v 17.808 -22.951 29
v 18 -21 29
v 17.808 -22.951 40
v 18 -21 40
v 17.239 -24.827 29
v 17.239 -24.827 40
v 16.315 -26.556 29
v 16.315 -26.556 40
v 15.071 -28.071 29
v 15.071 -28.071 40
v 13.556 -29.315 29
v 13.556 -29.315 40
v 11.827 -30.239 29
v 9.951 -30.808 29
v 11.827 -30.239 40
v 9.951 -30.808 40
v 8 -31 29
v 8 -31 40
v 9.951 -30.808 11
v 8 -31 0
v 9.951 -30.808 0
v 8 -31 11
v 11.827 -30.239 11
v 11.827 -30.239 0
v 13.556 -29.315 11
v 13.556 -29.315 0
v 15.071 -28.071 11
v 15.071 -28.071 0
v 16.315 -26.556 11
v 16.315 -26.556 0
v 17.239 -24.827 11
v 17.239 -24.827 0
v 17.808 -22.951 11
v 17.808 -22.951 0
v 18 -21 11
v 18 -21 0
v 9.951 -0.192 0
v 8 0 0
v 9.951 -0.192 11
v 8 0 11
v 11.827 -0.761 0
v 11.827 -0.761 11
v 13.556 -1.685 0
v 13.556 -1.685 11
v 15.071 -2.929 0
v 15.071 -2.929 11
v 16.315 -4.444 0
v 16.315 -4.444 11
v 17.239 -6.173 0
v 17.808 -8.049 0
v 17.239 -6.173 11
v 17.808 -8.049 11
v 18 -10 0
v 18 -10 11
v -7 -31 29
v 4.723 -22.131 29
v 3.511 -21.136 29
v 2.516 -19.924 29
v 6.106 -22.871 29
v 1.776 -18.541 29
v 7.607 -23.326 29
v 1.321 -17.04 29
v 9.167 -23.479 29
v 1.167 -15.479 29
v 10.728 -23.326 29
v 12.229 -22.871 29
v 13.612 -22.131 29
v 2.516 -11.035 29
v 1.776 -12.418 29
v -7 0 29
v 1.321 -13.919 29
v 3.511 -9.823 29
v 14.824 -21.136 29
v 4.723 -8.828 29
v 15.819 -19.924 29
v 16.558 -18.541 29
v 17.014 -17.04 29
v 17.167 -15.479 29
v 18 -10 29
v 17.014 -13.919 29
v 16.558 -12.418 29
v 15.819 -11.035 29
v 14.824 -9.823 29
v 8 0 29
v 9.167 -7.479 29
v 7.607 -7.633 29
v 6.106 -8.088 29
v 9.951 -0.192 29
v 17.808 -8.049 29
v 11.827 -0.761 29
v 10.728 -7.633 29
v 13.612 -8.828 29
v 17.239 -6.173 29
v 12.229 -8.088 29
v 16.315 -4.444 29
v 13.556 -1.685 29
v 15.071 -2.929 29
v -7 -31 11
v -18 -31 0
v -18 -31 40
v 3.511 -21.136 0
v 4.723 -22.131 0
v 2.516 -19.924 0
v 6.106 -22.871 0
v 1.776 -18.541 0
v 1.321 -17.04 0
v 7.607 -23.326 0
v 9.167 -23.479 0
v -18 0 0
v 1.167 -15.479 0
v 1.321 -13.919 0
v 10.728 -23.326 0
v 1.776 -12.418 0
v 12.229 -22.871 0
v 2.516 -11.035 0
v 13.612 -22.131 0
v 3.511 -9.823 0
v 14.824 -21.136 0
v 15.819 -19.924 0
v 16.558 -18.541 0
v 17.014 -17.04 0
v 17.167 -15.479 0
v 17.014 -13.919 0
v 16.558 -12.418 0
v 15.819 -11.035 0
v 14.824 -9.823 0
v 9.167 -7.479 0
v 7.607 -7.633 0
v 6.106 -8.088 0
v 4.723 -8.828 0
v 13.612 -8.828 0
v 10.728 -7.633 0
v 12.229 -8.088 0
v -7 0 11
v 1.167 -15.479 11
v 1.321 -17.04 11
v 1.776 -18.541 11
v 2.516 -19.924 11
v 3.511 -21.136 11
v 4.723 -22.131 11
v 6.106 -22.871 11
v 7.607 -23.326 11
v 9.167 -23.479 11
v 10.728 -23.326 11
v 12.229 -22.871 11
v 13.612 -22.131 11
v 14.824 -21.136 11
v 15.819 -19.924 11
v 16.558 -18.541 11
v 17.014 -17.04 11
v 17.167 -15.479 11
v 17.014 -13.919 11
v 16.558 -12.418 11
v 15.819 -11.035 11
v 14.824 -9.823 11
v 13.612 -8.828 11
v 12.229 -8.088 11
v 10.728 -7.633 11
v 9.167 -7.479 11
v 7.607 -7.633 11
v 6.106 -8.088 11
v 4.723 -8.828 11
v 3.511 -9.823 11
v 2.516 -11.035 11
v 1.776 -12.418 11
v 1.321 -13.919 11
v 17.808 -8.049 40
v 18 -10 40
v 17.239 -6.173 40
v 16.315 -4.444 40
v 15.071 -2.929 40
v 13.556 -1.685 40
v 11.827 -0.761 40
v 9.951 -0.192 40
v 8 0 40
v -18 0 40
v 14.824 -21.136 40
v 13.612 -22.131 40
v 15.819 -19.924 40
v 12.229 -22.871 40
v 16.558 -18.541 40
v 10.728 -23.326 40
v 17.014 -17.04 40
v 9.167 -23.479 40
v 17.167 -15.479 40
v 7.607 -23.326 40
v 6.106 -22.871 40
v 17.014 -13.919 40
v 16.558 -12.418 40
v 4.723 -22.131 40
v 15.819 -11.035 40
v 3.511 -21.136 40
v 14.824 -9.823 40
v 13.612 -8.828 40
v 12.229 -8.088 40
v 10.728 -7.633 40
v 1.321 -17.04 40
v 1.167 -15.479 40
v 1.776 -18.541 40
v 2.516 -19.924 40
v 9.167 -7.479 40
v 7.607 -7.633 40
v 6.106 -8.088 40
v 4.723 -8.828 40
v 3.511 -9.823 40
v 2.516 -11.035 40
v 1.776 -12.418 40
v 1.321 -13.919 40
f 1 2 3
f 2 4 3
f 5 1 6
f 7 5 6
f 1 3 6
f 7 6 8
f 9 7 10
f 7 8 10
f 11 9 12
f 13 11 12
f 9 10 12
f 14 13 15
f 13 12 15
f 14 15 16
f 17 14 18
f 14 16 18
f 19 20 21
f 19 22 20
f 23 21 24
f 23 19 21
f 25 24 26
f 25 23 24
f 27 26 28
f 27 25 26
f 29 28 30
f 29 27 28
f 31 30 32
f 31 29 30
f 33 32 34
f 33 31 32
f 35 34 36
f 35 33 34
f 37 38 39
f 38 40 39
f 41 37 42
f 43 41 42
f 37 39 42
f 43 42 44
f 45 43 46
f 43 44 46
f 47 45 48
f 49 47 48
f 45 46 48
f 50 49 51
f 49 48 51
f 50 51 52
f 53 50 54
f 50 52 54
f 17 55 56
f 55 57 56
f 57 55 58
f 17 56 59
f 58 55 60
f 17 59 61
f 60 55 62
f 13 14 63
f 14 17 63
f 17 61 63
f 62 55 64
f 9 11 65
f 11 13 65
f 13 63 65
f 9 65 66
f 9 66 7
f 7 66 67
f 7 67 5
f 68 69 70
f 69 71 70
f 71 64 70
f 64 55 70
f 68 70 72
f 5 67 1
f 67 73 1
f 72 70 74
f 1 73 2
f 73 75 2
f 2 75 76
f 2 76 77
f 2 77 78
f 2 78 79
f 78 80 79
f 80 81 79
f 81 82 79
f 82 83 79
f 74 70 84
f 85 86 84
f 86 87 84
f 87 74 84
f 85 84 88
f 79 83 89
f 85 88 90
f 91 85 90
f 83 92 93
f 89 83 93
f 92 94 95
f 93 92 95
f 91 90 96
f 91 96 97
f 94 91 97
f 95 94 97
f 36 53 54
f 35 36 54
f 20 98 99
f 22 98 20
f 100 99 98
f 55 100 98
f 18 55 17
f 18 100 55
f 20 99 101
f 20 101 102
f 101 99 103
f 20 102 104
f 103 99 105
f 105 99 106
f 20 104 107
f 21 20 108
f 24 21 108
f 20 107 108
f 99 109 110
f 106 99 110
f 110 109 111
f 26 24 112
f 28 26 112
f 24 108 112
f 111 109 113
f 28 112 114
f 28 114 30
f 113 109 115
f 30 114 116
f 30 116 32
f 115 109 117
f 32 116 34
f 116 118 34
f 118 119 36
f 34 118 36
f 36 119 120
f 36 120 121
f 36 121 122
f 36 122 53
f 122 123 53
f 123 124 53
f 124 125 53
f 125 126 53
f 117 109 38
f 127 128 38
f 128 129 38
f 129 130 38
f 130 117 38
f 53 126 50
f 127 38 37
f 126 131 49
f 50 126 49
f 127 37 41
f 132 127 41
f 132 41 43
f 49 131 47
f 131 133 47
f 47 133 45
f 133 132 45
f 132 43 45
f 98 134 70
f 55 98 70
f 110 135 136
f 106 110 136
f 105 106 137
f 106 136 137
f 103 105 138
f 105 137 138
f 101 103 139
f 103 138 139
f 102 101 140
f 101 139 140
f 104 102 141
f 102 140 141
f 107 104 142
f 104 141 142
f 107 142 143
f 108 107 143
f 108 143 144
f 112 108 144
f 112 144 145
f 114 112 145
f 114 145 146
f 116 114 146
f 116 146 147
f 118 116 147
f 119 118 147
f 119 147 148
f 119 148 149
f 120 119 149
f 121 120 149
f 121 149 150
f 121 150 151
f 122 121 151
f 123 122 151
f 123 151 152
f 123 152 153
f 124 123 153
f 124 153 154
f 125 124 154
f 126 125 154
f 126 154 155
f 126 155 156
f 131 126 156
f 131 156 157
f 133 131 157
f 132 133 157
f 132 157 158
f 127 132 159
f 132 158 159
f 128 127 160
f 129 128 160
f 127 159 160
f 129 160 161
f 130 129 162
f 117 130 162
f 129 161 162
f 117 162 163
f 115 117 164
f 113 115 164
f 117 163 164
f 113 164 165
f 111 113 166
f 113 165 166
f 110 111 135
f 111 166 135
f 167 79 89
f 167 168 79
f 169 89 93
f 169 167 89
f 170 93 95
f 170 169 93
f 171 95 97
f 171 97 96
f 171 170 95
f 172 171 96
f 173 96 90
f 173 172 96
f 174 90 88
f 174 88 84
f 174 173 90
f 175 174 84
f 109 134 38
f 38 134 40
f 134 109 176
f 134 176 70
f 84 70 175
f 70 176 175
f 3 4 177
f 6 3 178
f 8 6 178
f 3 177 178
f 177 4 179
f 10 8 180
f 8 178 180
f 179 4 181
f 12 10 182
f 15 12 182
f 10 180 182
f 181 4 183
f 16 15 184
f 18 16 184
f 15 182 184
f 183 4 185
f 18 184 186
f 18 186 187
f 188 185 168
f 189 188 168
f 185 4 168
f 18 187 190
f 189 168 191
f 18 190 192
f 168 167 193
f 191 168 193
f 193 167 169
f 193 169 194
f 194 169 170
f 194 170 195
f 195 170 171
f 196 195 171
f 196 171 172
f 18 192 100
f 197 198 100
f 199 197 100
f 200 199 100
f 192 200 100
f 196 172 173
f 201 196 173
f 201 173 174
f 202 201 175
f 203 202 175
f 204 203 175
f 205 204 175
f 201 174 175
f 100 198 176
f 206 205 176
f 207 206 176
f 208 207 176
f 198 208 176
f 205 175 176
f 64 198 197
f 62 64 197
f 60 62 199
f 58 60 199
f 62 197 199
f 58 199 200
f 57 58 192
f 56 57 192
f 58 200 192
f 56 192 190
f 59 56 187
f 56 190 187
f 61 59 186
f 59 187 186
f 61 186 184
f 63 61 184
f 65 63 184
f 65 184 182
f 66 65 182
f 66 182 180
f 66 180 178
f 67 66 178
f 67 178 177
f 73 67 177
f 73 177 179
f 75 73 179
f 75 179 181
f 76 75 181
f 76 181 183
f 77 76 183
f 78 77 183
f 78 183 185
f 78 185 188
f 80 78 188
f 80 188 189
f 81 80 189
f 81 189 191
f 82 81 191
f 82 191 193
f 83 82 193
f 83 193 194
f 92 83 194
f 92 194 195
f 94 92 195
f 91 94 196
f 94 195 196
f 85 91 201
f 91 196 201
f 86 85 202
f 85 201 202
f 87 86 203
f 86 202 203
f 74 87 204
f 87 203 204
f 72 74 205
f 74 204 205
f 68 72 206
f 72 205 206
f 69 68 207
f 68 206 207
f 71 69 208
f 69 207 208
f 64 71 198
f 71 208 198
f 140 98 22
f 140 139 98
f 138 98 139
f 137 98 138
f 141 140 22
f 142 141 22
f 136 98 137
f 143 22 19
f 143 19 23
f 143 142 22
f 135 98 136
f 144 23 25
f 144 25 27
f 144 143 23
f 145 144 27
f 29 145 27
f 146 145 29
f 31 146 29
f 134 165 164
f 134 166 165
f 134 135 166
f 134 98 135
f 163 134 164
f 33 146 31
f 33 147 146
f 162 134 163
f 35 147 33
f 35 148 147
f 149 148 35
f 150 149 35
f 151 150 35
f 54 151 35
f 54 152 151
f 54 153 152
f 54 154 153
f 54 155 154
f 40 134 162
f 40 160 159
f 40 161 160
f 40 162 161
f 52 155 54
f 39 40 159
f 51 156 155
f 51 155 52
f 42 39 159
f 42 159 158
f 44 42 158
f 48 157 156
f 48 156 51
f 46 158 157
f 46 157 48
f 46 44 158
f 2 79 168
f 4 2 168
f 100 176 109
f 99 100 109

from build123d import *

# Parameters (mm, degrees)
F0_W     = 25
F0_H     = 11
F0_W_2   = 11
F0_H_2   = 18
F1_DEPTH = 31
F3_D     = 16
F4_R     = 10


with BuildPart() as f1:
    # F0 (on Front) → F1 (new body)
    with BuildSketch(Plane.XZ):
        with Locations((5.5, 34.5)):
            Rectangle(F0_W, F0_H)
        with Locations((-12.5, 34.5)):
            Rectangle(F0_W_2, F0_H)
        with Locations((-12.5, 20)):
            Rectangle(F0_W_2, F0_H_2)
        with Locations((5.5, 5.5)):
            Rectangle(F0_W, F0_H)
        with Locations((-12.5, 5.5)):
            Rectangle(F0_W_2, F0_H)
    extrude(amount=F1_DEPTH)

    # F3 (through all)
    with Locations(Plane(origin=(0, 0, 0), x_dir=(1, 0, 0), z_dir=(0, 0, -1))):
        with Locations((9.1674635187, 15.4794855043)):
            Hole(F3_D / 2)

    # F4
    f4_edges = [f1.edges().sort_by_distance(p)[0] for p in [
        (18, 0, 5.5),
        (18, 0, 34.5),
        (18, -31, 5.5),
        (18, -31, 34.5),
    ]]
    fillet(f4_edges, radius=F4_R)


solid = f1.part
